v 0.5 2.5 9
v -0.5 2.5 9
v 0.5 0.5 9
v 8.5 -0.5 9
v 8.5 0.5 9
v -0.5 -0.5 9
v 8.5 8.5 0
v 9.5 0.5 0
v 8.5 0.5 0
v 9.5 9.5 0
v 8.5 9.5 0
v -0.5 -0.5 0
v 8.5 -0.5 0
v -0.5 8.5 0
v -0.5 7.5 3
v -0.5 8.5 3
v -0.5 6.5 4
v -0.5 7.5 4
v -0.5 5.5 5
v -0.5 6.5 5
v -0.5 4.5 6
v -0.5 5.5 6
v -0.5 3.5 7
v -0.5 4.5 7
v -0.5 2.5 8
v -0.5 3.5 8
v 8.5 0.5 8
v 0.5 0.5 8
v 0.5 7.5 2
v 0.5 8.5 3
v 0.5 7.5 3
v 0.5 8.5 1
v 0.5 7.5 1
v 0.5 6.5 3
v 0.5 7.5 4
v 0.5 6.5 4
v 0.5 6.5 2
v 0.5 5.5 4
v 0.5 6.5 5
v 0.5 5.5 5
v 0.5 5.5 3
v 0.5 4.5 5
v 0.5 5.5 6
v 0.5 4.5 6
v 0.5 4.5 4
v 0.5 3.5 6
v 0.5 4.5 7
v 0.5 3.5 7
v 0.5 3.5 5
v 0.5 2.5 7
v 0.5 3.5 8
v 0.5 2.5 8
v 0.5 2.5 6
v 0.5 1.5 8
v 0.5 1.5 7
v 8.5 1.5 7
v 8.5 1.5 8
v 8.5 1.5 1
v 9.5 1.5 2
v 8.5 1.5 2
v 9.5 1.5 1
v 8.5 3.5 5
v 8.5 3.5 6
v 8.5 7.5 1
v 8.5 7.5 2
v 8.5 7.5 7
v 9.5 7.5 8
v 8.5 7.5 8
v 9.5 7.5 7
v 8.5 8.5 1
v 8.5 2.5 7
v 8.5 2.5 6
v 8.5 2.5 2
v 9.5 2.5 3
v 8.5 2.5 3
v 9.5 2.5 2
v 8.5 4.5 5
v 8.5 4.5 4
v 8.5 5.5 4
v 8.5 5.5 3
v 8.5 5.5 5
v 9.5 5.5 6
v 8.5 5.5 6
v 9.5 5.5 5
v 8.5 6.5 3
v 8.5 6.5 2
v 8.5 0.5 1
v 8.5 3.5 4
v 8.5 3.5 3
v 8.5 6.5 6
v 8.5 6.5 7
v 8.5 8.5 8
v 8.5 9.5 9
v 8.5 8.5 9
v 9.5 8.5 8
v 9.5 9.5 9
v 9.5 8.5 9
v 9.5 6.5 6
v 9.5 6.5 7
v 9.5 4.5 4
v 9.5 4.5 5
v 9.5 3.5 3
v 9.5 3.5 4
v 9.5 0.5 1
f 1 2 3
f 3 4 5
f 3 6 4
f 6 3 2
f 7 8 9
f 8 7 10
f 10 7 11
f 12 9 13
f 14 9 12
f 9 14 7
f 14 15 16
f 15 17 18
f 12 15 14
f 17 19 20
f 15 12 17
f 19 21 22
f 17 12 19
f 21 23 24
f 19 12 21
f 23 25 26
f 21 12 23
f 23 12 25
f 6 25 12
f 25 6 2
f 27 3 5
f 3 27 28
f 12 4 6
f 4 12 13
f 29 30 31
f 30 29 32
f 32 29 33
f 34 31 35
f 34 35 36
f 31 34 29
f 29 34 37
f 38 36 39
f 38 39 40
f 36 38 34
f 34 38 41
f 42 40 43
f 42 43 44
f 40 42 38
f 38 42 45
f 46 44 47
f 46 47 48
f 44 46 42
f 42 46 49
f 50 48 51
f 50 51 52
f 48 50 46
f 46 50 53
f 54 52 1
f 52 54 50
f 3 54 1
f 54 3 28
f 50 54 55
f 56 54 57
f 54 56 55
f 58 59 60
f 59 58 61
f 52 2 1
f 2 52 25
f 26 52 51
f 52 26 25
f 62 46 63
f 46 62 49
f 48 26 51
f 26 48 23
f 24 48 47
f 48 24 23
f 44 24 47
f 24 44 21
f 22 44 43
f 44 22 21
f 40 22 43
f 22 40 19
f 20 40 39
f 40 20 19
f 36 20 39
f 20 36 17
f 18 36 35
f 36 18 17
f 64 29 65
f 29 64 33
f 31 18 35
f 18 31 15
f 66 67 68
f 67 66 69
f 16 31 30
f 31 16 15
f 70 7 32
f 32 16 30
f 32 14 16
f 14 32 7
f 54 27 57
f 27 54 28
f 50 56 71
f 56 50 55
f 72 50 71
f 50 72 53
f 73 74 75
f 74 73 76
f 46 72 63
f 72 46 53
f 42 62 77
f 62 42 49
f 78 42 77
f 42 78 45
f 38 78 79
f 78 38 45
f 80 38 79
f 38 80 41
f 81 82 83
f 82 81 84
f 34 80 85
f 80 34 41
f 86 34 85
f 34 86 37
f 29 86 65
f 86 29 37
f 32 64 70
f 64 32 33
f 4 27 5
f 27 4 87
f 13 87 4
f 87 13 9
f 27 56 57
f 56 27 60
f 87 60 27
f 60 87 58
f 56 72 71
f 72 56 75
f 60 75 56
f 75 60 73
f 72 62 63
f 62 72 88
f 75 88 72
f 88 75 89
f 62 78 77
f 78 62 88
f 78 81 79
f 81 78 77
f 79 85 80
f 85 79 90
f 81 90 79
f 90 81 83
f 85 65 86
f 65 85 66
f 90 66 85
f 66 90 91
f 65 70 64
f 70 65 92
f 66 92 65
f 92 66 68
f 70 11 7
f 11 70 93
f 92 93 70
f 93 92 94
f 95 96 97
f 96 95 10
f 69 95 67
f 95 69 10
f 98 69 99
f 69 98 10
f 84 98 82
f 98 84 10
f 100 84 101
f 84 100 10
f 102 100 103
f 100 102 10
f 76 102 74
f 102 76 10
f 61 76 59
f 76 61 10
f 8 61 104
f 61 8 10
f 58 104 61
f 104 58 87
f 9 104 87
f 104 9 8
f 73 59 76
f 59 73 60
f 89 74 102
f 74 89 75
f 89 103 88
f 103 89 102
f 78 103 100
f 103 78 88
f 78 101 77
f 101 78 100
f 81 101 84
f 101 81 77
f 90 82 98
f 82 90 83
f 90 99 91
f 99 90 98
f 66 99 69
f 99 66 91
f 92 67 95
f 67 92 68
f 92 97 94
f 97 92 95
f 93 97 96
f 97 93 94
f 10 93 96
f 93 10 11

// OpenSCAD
union() {
    translate([0, 0, 4.5]) cube([1, 1, 9], center=true);
    translate([0, 1, 4.5]) cube([1, 1, 9], center=true);
    translate([0, 2, 4.5]) cube([1, 1, 9], center=true);
    translate([0, 3, 4.0]) cube([1, 1, 8], center=true);
    translate([0, 4, 3.5]) cube([1, 1, 7], center=true);
    translate([0, 5, 3.0]) cube([1, 1, 6], center=true);
    translate([0, 6, 2.5]) cube([1, 1, 5], center=true);
    translate([0, 7, 2.0]) cube([1, 1, 4], center=true);
    translate([0, 8, 1.5]) cube([1, 1, 3], center=true);
    translate([1, 0, 4.5]) cube([1, 1, 9], center=true);
    translate([1, 1, 4.0]) cube([1, 1, 8], center=true);
    translate([1, 2, 3.5]) cube([1, 1, 7], center=true);
    translate([1, 3, 3.0]) cube([1, 1, 6], center=true);
    translate([1, 4, 2.5]) cube([1, 1, 5], center=true);
    translate([1, 5, 2.0]) cube([1, 1, 4], center=true);
    translate([1, 6, 1.5]) cube([1, 1, 3], center=true);
    translate([1, 7, 1.0]) cube([1, 1, 2], center=true);
    translate([1, 8, 0.5]) cube([1, 1, 1], center=true);
    translate([2, 0, 4.5]) cube([1, 1, 9], center=true);
    translate([2, 1, 4.0]) cube([1, 1, 8], center=true);
    translate([2, 2, 3.5]) cube([1, 1, 7], center=true);
    translate([2, 3, 3.0]) cube([1, 1, 6], center=true);
    translate([2, 4, 2.5]) cube([1, 1, 5], center=true);
    translate([2, 5, 2.0]) cube([1, 1, 4], center=true);
    translate([2, 6, 1.5]) cube([1, 1, 3], center=true);
    translate([2, 7, 1.0]) cube([1, 1, 2], center=true);
    translate([2, 8, 0.5]) cube([1, 1, 1], center=true);
    translate([3, 0, 4.5]) cube([1, 1, 9], center=true);
    translate([3, 1, 4.0]) cube([1, 1, 8], center=true);
    translate([3, 2, 3.5]) cube([1, 1, 7], center=true);
    translate([3, 3, 3.0]) cube([1, 1, 6], center=true);
    translate([3, 4, 2.5]) cube([1, 1, 5], center=true);
    translate([3, 5, 2.0]) cube([1, 1, 4], center=true);
    translate([3, 6, 1.5]) cube([1, 1, 3], center=true);
    translate([3, 7, 1.0]) cube([1, 1, 2], center=true);
    translate([3, 8, 0.5]) cube([1, 1, 1], center=true);
    translate([4, 0, 4.5]) cube([1, 1, 9], center=true);
    translate([4, 1, 4.0]) cube([1, 1, 8], center=true);
    translate([4, 2, 3.5]) cube([1, 1, 7], center=true);
    translate([4, 3, 3.0]) cube([1, 1, 6], center=true);
    translate([4, 4, 2.5]) cube([1, 1, 5], center=true);
    translate([4, 5, 2.0]) cube([1, 1, 4], center=true);
    translate([4, 6, 1.5]) cube([1, 1, 3], center=true);
    translate([4, 7, 1.0]) cube([1, 1, 2], center=true);
    translate([4, 8, 0.5]) cube([1, 1, 1], center=true);
    translate([5, 0, 4.5]) cube([1, 1, 9], center=true);
    translate([5, 1, 4.0]) cube([1, 1, 8], center=true);
    translate([5, 2, 3.5]) cube([1, 1, 7], center=true);
    translate([5, 3, 3.0]) cube([1, 1, 6], center=true);
    translate([5, 4, 2.5]) cube([1, 1, 5], center=true);
    translate([5, 5, 2.0]) cube([1, 1, 4], center=true);
    translate([5, 6, 1.5]) cube([1, 1, 3], center=true);
    translate([5, 7, 1.0]) cube([1, 1, 2], center=true);
    translate([5, 8, 0.5]) cube([1, 1, 1], center=true);
    translate([6, 0, 4.5]) cube([1, 1, 9], center=true);
    translate([6, 1, 4.0]) cube([1, 1, 8], center=true);
    translate([6, 2, 3.5]) cube([1, 1, 7], center=true);
    translate([6, 3, 3.0]) cube([1, 1, 6], center=true);
    translate([6, 4, 2.5]) cube([1, 1, 5], center=true);
    translate([6, 5, 2.0]) cube([1, 1, 4], center=true);
    translate([6, 6, 1.5]) cube([1, 1, 3], center=true);
    translate([6, 7, 1.0]) cube([1, 1, 2], center=true);
    translate([6, 8, 0.5]) cube([1, 1, 1], center=true);
    translate([7, 0, 4.5]) cube([1, 1, 9], center=true);
    translate([7, 1, 4.0]) cube([1, 1, 8], center=true);
    translate([7, 2, 3.5]) cube([1, 1, 7], center=true);
    translate([7, 3, 3.0]) cube([1, 1, 6], center=true);
    translate([7, 4, 2.5]) cube([1, 1, 5], center=true);
    translate([7, 5, 2.0]) cube([1, 1, 4], center=true);
    translate([7, 6, 1.5]) cube([1, 1, 3], center=true);
    translate([7, 7, 1.0]) cube([1, 1, 2], center=true);
    translate([7, 8, 0.5]) cube([1, 1, 1], center=true);
    translate([8, 0, 4.5]) cube([1, 1, 9], center=true);
    translate([8, 1, 4.0]) cube([1, 1, 8], center=true);
    translate([8, 2, 3.5]) cube([1, 1, 7], center=true);
    translate([8, 3, 3.0]) cube([1, 1, 6], center=true);
    translate([8, 4, 2.5]) cube([1, 1, 5], center=true);
    translate([8, 5, 2.0]) cube([1, 1, 4], center=true);
    translate([8, 6, 1.5]) cube([1, 1, 3], center=true);
    translate([8, 7, 1.0]) cube([1, 1, 2], center=true);
    translate([8, 8, 0.5]) cube([1, 1, 1], center=true);
    translate([9, 1, 0.5]) cube([1, 1, 1], center=true);
    translate([9, 2, 1.0]) cube([1, 1, 2], center=true);
    translate([9, 3, 1.5]) cube([1, 1, 3], center=true);
    translate([9, 4, 2.0]) cube([1, 1, 4], center=true);
    translate([9, 5, 2.5]) cube([1, 1, 5], center=true);
    translate([9, 6, 3.0]) cube([1, 1, 6], center=true);
    translate([9, 7, 3.5]) cube([1, 1, 7], center=true);
    translate([9, 8, 4.0]) cube([1, 1, 8], center=true);
    translate([9, 9, 4.5]) cube([1, 1, 9], center=true);
}
